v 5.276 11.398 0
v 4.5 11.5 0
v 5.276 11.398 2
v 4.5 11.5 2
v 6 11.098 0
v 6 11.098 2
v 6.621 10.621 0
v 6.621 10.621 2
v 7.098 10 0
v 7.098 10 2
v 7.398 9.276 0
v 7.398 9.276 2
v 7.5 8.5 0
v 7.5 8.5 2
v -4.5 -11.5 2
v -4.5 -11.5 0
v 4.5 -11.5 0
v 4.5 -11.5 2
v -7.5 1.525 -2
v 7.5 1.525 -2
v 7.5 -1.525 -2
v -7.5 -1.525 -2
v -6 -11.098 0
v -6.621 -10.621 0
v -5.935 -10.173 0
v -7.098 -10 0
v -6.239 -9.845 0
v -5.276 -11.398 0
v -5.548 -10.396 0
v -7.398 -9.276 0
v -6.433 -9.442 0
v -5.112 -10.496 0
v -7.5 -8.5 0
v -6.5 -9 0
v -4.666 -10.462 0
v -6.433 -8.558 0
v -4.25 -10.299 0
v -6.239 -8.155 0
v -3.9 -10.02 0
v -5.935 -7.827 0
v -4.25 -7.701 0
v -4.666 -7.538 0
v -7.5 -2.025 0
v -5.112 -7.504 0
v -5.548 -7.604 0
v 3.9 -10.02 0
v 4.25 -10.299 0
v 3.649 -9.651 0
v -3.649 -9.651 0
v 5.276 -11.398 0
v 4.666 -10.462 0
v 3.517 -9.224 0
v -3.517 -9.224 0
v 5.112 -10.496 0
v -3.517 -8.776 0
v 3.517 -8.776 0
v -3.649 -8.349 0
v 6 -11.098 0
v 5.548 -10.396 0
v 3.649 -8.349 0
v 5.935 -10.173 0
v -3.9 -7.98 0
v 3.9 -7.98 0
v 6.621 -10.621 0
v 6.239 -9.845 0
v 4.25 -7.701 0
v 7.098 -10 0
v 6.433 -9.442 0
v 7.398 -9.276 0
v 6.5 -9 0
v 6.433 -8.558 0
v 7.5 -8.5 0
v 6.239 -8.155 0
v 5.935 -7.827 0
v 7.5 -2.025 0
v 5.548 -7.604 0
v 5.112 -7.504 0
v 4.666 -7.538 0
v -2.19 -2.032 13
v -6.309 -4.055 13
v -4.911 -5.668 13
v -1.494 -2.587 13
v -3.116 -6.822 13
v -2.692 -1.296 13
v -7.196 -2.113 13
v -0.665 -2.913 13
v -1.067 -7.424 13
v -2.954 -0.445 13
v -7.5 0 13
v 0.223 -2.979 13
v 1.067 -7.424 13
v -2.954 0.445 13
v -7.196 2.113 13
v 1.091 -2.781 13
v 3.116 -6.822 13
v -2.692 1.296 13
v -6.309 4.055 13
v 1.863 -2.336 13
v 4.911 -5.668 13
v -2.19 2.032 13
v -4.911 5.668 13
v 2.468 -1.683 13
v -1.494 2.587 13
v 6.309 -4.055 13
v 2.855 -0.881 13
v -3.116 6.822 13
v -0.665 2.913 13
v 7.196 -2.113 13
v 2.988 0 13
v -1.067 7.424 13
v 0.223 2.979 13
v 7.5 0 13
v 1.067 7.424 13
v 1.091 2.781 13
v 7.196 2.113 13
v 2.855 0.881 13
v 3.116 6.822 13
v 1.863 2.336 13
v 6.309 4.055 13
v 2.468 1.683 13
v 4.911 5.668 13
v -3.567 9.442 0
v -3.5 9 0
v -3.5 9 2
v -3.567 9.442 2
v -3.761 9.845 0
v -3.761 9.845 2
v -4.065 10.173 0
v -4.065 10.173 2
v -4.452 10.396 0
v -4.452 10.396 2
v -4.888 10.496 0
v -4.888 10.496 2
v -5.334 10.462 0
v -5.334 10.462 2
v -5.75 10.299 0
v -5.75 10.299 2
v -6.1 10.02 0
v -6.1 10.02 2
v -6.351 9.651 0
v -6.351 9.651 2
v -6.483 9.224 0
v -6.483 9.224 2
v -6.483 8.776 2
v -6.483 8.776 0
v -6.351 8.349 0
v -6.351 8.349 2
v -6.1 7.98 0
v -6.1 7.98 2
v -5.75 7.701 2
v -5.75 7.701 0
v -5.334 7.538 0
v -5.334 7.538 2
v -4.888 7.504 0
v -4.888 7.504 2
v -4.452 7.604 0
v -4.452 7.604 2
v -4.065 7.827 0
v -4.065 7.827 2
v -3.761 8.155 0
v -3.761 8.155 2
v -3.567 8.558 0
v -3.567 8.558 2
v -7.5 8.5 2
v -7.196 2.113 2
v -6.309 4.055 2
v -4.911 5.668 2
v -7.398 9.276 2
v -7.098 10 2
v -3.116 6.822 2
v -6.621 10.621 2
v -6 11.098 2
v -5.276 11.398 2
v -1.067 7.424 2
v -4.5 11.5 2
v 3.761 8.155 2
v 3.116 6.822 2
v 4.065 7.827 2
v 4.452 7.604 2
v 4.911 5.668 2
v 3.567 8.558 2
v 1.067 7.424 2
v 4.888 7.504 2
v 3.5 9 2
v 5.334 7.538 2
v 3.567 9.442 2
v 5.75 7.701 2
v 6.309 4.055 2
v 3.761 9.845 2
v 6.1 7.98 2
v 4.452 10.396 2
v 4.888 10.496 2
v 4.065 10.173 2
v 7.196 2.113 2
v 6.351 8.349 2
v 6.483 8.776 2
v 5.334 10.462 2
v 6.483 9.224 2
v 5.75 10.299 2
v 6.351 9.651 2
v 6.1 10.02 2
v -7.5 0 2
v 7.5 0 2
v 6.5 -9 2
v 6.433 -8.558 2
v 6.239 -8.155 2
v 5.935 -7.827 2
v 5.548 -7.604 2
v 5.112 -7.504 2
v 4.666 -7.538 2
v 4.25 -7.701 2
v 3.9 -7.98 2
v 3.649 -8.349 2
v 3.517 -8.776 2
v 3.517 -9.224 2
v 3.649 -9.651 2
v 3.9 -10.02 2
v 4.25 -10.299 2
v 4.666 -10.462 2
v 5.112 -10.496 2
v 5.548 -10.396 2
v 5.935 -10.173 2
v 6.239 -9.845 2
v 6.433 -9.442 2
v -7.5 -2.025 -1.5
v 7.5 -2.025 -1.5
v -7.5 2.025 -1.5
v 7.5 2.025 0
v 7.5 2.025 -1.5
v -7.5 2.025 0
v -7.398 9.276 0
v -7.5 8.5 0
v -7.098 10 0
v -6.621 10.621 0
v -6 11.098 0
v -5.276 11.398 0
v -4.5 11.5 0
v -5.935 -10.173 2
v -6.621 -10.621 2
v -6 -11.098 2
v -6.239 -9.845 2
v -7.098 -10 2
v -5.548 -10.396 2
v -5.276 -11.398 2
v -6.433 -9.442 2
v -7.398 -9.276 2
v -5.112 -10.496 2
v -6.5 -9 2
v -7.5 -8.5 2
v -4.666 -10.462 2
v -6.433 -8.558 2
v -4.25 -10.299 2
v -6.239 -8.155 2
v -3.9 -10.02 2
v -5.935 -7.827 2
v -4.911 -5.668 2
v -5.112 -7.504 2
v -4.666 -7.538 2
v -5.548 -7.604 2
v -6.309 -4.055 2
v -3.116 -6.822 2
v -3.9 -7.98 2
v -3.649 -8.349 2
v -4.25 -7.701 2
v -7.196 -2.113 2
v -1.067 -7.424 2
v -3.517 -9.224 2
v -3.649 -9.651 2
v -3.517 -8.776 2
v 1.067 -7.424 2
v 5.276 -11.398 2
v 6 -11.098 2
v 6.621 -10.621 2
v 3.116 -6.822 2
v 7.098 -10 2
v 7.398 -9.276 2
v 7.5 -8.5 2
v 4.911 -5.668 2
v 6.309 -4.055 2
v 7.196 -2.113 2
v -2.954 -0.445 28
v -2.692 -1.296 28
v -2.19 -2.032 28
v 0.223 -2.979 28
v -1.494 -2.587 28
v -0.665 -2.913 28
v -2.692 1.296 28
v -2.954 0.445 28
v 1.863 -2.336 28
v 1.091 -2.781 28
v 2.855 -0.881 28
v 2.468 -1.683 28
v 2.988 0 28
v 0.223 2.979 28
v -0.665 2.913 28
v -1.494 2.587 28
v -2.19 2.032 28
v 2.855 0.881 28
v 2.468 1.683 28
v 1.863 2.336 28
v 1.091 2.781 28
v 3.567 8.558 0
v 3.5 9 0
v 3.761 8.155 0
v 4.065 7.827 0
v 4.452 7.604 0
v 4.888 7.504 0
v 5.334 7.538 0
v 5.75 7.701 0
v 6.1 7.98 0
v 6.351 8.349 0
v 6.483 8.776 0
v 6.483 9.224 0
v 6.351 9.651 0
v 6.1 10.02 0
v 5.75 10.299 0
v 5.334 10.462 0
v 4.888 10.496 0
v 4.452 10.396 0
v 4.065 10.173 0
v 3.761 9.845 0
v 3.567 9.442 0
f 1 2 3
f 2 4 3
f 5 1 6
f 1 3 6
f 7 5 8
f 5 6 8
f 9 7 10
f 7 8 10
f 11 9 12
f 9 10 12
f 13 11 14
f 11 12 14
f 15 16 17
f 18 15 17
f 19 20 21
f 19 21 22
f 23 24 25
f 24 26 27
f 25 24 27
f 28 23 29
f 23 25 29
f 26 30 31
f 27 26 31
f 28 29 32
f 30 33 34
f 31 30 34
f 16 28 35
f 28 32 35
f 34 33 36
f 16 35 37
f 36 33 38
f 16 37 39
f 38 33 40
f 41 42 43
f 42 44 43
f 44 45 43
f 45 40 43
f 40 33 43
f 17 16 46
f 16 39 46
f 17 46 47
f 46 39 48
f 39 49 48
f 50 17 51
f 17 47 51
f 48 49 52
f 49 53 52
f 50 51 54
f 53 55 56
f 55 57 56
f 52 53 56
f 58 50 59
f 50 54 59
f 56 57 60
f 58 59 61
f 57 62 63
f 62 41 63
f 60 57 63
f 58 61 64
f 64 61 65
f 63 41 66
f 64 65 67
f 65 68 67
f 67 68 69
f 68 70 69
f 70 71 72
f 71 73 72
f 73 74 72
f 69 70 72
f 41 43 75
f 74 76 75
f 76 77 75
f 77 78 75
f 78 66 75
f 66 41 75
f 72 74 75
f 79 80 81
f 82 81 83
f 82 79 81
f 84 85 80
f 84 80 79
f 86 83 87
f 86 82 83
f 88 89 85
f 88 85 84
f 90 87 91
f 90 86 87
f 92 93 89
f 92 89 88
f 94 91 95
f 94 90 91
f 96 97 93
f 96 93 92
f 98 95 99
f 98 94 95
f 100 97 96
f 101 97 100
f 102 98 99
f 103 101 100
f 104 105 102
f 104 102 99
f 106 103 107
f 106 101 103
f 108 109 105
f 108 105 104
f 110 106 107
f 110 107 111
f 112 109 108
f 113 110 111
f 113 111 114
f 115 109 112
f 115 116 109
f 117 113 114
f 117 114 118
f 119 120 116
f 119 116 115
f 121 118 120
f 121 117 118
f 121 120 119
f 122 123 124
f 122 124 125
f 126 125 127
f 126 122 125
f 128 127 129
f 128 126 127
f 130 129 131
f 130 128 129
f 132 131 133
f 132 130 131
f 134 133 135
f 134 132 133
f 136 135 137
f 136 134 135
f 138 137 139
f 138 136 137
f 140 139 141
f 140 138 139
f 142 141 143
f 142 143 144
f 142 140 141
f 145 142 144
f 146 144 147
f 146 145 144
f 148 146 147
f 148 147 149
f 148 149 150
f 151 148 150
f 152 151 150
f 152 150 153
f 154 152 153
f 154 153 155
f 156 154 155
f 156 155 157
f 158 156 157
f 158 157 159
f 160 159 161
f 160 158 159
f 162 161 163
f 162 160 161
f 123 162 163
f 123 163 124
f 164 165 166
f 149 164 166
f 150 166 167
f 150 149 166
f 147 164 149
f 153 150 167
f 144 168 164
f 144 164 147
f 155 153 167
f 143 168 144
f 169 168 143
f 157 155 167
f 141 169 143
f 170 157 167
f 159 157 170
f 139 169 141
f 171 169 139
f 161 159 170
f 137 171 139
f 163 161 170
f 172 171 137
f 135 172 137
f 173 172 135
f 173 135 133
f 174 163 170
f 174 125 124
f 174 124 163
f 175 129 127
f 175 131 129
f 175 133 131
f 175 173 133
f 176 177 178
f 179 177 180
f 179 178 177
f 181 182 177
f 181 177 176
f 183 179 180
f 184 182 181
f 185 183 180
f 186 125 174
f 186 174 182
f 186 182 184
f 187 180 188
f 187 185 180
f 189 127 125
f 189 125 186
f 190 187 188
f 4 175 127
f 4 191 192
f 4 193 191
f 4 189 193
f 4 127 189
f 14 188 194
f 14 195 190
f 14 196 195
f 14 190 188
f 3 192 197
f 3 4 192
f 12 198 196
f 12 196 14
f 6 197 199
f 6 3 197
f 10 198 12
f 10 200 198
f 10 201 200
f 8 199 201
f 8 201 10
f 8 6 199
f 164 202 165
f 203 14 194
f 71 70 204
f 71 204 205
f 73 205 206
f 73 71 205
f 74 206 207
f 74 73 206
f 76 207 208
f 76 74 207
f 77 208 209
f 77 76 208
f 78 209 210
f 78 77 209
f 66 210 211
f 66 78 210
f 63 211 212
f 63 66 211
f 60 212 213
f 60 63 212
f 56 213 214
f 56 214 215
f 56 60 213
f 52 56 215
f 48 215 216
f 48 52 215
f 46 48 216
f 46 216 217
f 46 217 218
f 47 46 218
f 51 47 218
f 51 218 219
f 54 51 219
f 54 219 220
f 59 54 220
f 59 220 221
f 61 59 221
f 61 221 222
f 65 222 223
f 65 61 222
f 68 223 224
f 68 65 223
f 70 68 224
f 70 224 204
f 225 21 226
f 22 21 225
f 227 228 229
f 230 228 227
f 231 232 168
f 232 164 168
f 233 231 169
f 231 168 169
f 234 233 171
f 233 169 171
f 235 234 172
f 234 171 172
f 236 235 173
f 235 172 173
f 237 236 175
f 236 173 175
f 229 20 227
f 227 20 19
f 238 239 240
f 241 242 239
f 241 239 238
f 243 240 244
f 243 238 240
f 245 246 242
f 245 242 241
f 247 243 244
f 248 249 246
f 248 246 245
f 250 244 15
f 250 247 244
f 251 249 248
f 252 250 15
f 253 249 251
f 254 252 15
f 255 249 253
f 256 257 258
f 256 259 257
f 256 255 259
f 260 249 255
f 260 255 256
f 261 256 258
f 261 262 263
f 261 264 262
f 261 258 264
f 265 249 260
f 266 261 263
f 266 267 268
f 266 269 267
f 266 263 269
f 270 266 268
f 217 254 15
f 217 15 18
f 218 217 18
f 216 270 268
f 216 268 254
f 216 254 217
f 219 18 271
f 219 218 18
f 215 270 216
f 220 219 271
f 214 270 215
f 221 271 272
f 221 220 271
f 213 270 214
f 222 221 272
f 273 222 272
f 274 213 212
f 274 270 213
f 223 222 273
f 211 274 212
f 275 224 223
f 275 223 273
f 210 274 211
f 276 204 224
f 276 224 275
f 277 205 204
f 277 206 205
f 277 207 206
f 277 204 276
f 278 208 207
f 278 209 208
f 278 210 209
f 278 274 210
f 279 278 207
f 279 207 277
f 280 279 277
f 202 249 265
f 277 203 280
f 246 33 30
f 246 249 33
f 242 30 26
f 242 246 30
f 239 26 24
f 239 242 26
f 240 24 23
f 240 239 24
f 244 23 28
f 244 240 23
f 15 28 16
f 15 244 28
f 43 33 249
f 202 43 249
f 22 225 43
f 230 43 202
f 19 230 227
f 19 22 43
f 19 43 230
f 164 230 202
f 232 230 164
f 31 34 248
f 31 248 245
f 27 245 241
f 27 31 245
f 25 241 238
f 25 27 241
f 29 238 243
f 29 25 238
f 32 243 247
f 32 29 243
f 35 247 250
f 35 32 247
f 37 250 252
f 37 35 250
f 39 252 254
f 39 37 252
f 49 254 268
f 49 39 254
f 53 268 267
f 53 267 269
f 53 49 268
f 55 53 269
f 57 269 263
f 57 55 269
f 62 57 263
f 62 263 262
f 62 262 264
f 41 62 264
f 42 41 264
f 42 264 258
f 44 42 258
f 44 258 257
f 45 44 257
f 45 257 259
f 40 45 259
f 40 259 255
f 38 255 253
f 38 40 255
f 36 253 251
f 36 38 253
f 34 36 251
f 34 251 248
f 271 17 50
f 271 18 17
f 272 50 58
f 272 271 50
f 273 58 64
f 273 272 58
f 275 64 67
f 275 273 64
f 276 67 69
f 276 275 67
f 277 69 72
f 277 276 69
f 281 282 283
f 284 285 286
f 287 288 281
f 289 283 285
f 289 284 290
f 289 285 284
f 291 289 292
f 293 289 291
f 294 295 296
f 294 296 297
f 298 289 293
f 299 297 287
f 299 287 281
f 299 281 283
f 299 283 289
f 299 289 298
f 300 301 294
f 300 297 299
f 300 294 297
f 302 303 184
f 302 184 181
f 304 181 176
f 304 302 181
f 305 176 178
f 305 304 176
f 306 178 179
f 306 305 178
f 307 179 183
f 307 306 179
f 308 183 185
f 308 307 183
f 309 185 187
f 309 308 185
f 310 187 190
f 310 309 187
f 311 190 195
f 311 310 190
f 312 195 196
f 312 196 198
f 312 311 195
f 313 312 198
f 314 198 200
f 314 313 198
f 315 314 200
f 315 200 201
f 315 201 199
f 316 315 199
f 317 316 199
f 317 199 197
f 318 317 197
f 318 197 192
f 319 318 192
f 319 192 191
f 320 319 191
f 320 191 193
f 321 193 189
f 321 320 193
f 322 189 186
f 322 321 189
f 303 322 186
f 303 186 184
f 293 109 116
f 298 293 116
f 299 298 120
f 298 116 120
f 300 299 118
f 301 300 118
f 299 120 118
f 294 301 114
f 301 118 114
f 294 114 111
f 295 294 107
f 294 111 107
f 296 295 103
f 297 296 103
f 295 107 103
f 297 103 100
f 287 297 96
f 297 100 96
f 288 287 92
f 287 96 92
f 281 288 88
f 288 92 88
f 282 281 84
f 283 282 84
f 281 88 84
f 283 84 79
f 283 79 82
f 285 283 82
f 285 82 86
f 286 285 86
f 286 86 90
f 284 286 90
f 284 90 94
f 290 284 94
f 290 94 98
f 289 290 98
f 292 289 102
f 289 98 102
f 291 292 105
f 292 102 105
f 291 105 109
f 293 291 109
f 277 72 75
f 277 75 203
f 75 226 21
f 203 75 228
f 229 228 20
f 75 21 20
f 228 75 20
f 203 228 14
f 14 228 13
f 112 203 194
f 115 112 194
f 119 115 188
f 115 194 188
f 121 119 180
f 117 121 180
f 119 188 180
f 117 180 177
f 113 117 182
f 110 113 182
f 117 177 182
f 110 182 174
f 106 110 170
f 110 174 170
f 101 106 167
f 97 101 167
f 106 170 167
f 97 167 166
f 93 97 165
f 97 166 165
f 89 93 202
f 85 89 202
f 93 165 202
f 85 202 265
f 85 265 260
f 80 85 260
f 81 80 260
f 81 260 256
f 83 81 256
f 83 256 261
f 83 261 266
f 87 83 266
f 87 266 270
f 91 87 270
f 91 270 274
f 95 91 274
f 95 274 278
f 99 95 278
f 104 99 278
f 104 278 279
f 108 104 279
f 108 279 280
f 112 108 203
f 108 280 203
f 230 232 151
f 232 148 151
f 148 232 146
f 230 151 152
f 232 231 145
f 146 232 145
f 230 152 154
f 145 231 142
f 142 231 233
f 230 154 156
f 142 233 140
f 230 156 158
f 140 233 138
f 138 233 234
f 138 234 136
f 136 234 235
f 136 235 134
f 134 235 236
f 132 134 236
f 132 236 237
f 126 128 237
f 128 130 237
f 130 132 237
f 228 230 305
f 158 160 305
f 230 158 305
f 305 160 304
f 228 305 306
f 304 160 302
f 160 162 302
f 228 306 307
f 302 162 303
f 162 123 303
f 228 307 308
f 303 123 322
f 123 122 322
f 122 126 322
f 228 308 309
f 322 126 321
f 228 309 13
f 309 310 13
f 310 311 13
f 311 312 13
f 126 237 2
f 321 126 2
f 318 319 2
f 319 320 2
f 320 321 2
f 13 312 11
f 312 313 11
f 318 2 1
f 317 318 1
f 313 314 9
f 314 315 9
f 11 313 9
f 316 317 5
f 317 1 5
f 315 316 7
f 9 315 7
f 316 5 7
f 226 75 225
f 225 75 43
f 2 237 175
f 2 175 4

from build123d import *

# Parameters (mm, degrees)
SKETCH1_W           = 15
SKETCH1_H           = 23
SKETCH1_R           = 1.5
BOSS_EXTRUDE1_DEPTH = 2
SKETCH2_R           = 7.5
BOSS_EXTRUDE2_DEPTH = 11
SKETCH3_R           = 2.9875
BOSS_EXTRUDE3_DEPTH = 15
SKETCH4_W           = 15
SKETCH4_H           = 4.05
BOSS_EXTRUDE4_DEPTH = 2
CHAMFER1_SIZE       = 0.5
FILLET1_R           = 3


with BuildPart() as part:
    # Sketch1 → Boss-Extrude1 (new body)
    with BuildSketch(Plane.XY):
        Rectangle(SKETCH1_W, SKETCH1_H)
        with Locations((-5, 9)):
            Circle(SKETCH1_R, mode=Mode.SUBTRACT)
        with Locations(Location((5, 9, 0), (0, 0, 180))):
            Circle(SKETCH1_R, mode=Mode.SUBTRACT)
        with Locations((5, -9)):
            Circle(SKETCH1_R, mode=Mode.SUBTRACT)
        with Locations(Location((-5, -9, 0), (0, 0, 180))):
            Circle(SKETCH1_R, mode=Mode.SUBTRACT)
    extrude(amount=BOSS_EXTRUDE1_DEPTH)

    # Sketch2 → Boss-Extrude2 (add)
    with BuildSketch(Plane.XY.offset(2)):
        Circle(SKETCH2_R)
    extrude(amount=BOSS_EXTRUDE2_DEPTH)

    # Sketch3 → Boss-Extrude3 (add)
    with BuildSketch(Plane.XY.offset(13)):
        Circle(SKETCH3_R)
    extrude(amount=BOSS_EXTRUDE3_DEPTH)

    # Sketch4 → Boss-Extrude4 (add)
    with BuildSketch(Plane(origin=(0, 0, 0), x_dir=(-1, 0, 0), z_dir=(0, 0, -1))):
        Rectangle(SKETCH4_W, SKETCH4_H)
    extrude(amount=BOSS_EXTRUDE4_DEPTH)

    # Chamfer1
    chamfer1_edges = [part.edges().sort_by_distance(p)[0] for p in [
        (0, -2.025, -2),
        (0, 2.025, -2),
    ]]
    chamfer(chamfer1_edges, length=CHAMFER1_SIZE)

    # Fillet1
    fillet1_edges = [part.edges().sort_by_distance(p)[0] for p in [
        (-7.5, 11.5, 1),
        (7.5, 11.5, 1),
        (7.5, -11.5, 1),
        (-7.5, -11.5, 1),
    ]]
    fillet(fillet1_edges, radius=FILLET1_R)


solid = part.part
